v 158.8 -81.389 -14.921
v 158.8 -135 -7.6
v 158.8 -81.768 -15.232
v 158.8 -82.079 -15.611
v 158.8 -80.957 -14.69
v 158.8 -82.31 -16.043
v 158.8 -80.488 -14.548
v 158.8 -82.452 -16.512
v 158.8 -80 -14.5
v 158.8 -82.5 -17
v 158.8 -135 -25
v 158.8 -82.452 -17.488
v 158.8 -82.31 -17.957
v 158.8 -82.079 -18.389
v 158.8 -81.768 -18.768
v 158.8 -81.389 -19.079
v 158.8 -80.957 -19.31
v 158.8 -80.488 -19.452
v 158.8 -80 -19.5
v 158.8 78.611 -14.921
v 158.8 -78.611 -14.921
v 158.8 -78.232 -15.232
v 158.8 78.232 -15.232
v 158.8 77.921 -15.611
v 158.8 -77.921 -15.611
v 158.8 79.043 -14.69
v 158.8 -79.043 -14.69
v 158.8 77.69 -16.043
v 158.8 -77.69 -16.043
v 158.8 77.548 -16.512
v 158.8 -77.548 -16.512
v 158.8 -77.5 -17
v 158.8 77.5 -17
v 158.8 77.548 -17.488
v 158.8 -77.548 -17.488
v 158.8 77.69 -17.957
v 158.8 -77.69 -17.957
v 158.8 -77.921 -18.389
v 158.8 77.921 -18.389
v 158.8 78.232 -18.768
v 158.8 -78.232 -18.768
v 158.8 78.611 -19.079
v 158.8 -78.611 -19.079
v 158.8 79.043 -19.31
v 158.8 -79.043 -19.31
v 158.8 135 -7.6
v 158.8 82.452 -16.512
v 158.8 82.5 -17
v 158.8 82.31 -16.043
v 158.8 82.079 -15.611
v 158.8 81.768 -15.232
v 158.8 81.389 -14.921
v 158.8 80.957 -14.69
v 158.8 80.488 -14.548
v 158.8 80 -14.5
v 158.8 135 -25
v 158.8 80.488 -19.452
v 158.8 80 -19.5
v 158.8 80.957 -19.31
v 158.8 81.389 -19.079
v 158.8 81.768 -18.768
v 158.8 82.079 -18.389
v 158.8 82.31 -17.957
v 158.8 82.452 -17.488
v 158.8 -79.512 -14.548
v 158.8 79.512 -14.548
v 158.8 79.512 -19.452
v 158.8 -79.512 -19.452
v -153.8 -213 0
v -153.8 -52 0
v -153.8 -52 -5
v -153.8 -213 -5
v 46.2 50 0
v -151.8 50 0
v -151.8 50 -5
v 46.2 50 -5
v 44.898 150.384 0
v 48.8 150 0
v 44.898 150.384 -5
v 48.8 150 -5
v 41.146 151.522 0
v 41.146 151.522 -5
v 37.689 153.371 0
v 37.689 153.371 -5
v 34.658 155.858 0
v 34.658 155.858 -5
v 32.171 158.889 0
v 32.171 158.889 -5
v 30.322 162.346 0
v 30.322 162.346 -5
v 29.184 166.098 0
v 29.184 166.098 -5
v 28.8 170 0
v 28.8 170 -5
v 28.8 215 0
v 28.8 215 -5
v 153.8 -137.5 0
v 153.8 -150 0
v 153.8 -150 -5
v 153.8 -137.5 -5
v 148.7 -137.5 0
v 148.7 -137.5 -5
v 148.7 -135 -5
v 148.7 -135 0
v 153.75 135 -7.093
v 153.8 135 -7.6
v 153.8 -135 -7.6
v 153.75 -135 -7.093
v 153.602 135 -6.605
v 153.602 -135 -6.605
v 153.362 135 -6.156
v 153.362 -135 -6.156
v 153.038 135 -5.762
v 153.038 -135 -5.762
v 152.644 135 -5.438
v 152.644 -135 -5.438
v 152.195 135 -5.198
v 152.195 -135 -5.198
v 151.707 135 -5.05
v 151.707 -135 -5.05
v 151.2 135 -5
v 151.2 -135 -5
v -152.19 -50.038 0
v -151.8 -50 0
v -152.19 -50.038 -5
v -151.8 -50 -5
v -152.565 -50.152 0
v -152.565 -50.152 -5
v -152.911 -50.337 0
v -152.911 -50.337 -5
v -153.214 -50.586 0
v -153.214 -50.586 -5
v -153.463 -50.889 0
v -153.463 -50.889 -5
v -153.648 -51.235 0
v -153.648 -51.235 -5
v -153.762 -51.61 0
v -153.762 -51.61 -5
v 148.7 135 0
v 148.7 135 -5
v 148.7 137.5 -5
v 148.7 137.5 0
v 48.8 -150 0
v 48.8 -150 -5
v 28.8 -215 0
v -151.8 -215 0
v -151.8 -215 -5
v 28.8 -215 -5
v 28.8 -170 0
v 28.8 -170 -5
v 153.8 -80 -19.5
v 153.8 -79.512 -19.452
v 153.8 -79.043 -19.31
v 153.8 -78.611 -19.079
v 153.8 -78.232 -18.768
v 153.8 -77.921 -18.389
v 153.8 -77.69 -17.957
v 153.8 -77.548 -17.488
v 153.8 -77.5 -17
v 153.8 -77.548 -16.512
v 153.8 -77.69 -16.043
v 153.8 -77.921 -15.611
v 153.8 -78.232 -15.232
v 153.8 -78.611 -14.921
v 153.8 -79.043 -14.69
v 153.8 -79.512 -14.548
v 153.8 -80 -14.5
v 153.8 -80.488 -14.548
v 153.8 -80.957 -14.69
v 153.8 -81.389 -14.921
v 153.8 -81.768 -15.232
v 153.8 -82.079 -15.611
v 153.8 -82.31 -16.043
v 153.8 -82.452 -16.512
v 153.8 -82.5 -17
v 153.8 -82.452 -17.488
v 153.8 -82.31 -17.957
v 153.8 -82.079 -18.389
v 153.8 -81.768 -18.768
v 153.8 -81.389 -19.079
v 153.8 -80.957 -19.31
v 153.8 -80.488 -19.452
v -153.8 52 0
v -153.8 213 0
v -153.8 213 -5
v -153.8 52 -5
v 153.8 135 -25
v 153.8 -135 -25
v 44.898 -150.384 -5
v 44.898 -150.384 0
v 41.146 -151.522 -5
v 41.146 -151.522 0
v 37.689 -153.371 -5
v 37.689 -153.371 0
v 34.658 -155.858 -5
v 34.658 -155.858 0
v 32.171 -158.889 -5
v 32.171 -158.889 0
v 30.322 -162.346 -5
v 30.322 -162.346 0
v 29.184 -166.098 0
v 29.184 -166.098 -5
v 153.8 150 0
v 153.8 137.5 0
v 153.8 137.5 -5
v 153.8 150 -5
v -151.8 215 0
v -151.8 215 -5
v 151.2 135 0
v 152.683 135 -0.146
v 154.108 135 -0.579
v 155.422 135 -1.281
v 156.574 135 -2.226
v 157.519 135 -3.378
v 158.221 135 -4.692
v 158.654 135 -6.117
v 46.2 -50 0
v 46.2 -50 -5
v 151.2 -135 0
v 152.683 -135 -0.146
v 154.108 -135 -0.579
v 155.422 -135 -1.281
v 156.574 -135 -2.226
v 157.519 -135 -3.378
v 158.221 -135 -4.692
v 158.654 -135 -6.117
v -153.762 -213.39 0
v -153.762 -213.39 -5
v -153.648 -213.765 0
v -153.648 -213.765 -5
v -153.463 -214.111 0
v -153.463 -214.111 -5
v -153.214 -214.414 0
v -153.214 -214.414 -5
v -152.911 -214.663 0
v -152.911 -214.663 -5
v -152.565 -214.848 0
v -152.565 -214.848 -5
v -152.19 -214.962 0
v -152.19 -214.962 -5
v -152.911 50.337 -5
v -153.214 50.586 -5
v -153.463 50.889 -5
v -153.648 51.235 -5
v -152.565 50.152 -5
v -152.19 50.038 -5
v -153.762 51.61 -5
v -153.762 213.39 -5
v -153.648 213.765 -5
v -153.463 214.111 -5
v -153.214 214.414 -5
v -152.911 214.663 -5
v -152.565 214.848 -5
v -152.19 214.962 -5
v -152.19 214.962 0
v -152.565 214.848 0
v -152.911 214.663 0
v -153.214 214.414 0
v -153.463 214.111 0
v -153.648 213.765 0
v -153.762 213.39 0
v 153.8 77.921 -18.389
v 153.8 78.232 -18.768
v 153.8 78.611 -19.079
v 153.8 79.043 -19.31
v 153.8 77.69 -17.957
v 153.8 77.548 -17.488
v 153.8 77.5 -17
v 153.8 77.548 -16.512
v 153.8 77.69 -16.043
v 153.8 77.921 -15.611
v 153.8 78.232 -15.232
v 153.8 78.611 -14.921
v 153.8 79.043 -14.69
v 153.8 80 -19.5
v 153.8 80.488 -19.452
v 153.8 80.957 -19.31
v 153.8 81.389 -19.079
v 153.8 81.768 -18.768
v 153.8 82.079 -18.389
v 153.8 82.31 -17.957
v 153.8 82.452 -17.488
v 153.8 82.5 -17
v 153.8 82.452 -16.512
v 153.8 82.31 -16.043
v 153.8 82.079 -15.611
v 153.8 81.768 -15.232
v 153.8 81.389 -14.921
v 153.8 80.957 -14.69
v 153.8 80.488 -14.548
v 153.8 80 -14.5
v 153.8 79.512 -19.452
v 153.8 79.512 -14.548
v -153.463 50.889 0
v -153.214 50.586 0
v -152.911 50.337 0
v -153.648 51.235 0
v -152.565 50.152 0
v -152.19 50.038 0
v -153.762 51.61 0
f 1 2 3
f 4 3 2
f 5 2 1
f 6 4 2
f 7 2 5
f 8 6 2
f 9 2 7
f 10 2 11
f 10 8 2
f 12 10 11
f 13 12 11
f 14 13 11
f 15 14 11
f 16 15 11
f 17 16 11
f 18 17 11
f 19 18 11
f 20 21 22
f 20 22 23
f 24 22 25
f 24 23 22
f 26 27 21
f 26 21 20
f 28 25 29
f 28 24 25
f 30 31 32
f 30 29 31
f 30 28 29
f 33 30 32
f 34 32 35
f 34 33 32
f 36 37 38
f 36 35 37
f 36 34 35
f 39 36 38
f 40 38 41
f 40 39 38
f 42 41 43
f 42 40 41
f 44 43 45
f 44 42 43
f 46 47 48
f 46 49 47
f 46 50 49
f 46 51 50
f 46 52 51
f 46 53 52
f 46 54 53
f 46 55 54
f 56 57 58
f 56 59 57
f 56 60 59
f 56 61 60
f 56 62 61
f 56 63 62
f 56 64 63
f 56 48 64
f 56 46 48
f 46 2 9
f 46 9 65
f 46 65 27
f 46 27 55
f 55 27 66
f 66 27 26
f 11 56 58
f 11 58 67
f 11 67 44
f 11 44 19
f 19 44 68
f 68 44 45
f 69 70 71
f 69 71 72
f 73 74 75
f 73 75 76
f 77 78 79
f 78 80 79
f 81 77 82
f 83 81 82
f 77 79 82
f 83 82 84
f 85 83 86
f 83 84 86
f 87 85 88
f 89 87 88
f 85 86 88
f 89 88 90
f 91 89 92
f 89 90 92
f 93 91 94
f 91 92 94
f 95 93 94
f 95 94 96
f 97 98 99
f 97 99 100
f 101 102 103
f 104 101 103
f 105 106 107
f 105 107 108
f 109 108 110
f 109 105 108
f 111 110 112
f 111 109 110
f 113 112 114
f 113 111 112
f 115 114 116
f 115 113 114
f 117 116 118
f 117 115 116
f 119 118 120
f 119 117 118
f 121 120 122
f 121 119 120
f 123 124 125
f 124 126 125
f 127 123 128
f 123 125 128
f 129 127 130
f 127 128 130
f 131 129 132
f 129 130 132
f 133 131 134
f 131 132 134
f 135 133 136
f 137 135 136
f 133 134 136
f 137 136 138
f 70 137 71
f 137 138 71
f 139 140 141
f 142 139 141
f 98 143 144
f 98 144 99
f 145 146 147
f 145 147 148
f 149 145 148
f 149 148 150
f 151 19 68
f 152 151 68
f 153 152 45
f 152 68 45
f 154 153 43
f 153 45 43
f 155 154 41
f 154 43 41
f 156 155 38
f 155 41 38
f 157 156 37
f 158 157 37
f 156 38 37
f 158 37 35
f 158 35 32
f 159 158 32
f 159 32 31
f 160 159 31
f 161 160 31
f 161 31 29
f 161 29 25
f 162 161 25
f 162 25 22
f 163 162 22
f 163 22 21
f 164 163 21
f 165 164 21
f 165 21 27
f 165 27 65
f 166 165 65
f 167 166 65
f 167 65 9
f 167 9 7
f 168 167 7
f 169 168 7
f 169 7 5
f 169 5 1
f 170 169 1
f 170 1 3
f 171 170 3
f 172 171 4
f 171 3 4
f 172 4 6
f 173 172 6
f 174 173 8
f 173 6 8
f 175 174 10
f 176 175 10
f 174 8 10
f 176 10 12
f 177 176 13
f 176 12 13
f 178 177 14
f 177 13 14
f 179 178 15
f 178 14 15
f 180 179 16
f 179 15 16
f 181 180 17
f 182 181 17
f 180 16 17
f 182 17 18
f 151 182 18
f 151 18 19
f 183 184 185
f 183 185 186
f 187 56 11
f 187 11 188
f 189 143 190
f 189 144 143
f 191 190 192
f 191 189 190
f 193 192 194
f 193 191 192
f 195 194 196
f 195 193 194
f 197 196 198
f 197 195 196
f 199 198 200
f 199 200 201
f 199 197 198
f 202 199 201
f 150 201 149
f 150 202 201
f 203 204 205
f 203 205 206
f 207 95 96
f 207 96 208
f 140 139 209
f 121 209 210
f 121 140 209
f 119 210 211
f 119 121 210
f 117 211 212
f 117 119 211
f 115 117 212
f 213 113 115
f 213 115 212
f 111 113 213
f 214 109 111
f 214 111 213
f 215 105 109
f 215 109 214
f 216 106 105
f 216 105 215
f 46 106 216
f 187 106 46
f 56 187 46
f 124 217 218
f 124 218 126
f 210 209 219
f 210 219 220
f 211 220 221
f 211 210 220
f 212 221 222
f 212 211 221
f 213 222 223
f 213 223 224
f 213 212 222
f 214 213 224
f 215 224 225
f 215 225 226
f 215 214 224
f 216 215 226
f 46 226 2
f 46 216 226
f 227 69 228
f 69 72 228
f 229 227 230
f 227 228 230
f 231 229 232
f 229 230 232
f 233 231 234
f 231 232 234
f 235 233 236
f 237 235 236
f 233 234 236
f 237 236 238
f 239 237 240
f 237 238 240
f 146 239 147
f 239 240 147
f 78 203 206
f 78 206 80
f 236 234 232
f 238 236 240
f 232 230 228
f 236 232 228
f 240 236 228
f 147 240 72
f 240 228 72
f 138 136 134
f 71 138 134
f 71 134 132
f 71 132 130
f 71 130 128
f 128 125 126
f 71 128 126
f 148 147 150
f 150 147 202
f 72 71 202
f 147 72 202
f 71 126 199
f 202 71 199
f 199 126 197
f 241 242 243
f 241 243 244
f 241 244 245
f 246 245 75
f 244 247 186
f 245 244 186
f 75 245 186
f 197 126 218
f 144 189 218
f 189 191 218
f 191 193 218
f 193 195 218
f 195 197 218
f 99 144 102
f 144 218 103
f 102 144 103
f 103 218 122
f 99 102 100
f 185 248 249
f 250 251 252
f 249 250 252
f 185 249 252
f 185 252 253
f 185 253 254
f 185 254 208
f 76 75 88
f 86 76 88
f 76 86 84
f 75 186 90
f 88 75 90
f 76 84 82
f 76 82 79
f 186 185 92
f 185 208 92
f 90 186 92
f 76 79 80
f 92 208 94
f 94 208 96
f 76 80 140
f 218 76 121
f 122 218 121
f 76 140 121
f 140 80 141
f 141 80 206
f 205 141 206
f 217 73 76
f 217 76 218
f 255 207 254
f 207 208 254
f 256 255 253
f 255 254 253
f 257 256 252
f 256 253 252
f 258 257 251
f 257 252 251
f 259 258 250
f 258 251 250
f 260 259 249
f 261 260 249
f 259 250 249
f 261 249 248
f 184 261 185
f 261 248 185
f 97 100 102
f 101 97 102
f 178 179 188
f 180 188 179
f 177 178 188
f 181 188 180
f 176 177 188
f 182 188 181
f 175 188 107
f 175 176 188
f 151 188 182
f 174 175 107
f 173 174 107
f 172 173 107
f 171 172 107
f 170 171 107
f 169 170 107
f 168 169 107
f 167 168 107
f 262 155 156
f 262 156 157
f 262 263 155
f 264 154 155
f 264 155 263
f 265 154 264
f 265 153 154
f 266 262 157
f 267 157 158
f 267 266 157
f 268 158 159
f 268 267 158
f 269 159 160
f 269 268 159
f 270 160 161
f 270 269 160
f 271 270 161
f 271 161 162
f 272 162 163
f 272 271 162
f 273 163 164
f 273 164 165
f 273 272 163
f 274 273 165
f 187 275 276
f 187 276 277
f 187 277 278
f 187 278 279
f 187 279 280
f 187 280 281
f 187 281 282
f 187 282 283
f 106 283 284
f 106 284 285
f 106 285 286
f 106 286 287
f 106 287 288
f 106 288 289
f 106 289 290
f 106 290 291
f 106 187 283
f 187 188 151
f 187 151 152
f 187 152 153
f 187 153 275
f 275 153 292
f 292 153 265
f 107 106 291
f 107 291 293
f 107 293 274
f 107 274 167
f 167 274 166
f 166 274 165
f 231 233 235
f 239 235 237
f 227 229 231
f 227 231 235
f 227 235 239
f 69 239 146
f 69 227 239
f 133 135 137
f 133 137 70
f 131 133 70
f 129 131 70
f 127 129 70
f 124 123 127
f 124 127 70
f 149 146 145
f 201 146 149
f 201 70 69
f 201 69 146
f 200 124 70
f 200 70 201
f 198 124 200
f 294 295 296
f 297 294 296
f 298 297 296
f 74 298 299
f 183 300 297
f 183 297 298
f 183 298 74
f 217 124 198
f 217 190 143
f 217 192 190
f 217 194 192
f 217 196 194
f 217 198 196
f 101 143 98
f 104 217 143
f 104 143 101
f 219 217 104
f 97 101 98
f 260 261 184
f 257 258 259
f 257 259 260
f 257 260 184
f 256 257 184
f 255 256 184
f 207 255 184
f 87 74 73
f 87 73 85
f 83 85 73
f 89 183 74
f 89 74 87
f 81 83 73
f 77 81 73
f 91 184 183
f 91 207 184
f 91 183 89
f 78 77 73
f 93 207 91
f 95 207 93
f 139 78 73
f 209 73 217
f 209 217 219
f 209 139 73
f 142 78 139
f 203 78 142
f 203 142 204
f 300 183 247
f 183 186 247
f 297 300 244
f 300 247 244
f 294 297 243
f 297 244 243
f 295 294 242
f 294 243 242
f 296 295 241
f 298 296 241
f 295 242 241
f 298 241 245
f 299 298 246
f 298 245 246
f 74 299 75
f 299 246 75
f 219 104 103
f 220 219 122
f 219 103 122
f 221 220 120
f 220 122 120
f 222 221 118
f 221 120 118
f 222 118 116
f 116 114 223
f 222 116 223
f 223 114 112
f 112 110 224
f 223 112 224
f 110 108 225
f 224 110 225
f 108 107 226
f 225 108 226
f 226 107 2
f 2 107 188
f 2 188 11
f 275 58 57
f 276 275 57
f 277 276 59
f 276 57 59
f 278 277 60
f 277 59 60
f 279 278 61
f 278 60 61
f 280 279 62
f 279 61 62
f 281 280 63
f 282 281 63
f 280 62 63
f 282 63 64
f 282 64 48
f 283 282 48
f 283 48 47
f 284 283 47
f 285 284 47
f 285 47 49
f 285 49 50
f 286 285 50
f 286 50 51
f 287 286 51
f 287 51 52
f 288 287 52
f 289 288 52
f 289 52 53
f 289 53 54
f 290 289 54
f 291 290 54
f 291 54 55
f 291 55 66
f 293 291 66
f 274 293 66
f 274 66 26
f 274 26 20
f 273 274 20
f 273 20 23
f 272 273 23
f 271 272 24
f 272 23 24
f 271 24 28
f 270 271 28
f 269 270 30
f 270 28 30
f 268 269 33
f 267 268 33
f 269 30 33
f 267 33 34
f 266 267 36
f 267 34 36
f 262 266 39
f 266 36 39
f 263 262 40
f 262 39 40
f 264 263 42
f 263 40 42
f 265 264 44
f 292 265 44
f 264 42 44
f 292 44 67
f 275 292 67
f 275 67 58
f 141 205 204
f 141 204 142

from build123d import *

# Parameters (mm, degrees)
BASE_FLANGE1_DEPTH            = 5
EDGE_FLANGE1_STRIP_W          = 25.2
EDGE_FLANGE1_STRIP_H          = 5
EDGE_FLANGE1_STRIP_CUT_DEPTH  = 270
EDGE_FLANGE1_RELIEF_W         = 27.7
EDGE_FLANGE1_RELIEF_H         = 2.5
EDGE_FLANGE1_RELIEF_CUT_DEPTH = 5
EDGE_FLANGE1_DEPTH            = 270
SKETCH9_R                     = 2.5
CUT_EXTRUDE1_DEPTH            = 10
FILLET1_R                     = 20
FILLET2_R                     = 2


# Sheet-metal steps are written as plain solids
with BuildPart() as part:
    # Sketch1 → Base-Flange1 (new body)
    with BuildSketch(Plane.XY):
        Polygon((28.8, 215), (-153.8, 215), (-153.8, 50), (46.2, 50), (46.2, -50), (-153.8, -50), (-153.8, -215), (28.8, -215), (28.8, -150), (153.8, -150), (153.8, 150), (28.8, 150), align=None)
    extrude(amount=-BASE_FLANGE1_DEPTH)

    # Edge-Flange1 strip (across the edge) → Edge-Flange1 strip cut (cut)
    with BuildSketch(Plane(origin=(153.8, 135, -5), x_dir=(-1, 0, 0), z_dir=(0, -1, 0))):
        with Locations((-10, -2.5)):
            Rectangle(EDGE_FLANGE1_STRIP_W, EDGE_FLANGE1_STRIP_H)
    extrude(amount=EDGE_FLANGE1_STRIP_CUT_DEPTH, mode=Mode.SUBTRACT)

    # Edge-Flange1 relief (on the sheet) → Edge-Flange1 relief cut (cut)
    with BuildSketch(Plane(origin=(151.2, 135, -5), x_dir=(-1, 0, 0), z_dir=(0, 0, -1))):
        with Locations((-11.35, 1.25)):
            Rectangle(EDGE_FLANGE1_RELIEF_W, EDGE_FLANGE1_RELIEF_H)
        with Locations((-11.35, -271.25)):
            Rectangle(EDGE_FLANGE1_RELIEF_W, EDGE_FLANGE1_RELIEF_H)
    extrude(amount=-EDGE_FLANGE1_RELIEF_CUT_DEPTH, mode=Mode.SUBTRACT)

    # Edge-Flange1 section (across the edge) → Edge-Flange1 (add)
    with BuildSketch(Plane(origin=(153.8, 135, -5), x_dir=(-1, 0, 0), z_dir=(0, -1, 0))):
        with BuildLine():
            Line((-5, 2.6), (-5, 20))
            Line((-5, 20), (0, 20))
            Line((0, 20), (0, 2.6))
            ThreePointArc((0, 2.6), (0.761522369, 0.761522369), (2.6, 0))
            Line((2.6, 0), (2.6, -5))
            ThreePointArc((2.6, -5), (-2.774011537, -2.774011537), (-5, 2.6))
        make_face()
    extrude(amount=EDGE_FLANGE1_DEPTH)

    # Sketch9 → Cut-Extrude1 (cut)
    with BuildSketch(Plane(origin=(158.8, 0, 0), x_dir=(0, 0, -1), z_dir=(1, 0, 0))):
        with Locations((17, 80)):
            Circle(SKETCH9_R)
        with Locations((17, -80)):
            Circle(SKETCH9_R)
    extrude(amount=-CUT_EXTRUDE1_DEPTH, mode=Mode.SUBTRACT)

    # Fillet1
    fillet1_edges = [part.edges().sort_by_distance(p)[0] for p in [
        (28.8, 150, -2.5),
        (28.8, -150, -2.5),
    ]]
    fillet(fillet1_edges, radius=FILLET1_R)

    # Fillet2
    fillet2_edges = [part.edges().sort_by_distance(p)[0] for p in [
        (-153.8, -50, -2.5),
        (-153.8, 50, -2.5),
        (-153.8, 215, -2.5),
        (-153.8, -215, -2.5),
    ]]
    fillet(fillet2_edges, radius=FILLET2_R)


solid = part.part
